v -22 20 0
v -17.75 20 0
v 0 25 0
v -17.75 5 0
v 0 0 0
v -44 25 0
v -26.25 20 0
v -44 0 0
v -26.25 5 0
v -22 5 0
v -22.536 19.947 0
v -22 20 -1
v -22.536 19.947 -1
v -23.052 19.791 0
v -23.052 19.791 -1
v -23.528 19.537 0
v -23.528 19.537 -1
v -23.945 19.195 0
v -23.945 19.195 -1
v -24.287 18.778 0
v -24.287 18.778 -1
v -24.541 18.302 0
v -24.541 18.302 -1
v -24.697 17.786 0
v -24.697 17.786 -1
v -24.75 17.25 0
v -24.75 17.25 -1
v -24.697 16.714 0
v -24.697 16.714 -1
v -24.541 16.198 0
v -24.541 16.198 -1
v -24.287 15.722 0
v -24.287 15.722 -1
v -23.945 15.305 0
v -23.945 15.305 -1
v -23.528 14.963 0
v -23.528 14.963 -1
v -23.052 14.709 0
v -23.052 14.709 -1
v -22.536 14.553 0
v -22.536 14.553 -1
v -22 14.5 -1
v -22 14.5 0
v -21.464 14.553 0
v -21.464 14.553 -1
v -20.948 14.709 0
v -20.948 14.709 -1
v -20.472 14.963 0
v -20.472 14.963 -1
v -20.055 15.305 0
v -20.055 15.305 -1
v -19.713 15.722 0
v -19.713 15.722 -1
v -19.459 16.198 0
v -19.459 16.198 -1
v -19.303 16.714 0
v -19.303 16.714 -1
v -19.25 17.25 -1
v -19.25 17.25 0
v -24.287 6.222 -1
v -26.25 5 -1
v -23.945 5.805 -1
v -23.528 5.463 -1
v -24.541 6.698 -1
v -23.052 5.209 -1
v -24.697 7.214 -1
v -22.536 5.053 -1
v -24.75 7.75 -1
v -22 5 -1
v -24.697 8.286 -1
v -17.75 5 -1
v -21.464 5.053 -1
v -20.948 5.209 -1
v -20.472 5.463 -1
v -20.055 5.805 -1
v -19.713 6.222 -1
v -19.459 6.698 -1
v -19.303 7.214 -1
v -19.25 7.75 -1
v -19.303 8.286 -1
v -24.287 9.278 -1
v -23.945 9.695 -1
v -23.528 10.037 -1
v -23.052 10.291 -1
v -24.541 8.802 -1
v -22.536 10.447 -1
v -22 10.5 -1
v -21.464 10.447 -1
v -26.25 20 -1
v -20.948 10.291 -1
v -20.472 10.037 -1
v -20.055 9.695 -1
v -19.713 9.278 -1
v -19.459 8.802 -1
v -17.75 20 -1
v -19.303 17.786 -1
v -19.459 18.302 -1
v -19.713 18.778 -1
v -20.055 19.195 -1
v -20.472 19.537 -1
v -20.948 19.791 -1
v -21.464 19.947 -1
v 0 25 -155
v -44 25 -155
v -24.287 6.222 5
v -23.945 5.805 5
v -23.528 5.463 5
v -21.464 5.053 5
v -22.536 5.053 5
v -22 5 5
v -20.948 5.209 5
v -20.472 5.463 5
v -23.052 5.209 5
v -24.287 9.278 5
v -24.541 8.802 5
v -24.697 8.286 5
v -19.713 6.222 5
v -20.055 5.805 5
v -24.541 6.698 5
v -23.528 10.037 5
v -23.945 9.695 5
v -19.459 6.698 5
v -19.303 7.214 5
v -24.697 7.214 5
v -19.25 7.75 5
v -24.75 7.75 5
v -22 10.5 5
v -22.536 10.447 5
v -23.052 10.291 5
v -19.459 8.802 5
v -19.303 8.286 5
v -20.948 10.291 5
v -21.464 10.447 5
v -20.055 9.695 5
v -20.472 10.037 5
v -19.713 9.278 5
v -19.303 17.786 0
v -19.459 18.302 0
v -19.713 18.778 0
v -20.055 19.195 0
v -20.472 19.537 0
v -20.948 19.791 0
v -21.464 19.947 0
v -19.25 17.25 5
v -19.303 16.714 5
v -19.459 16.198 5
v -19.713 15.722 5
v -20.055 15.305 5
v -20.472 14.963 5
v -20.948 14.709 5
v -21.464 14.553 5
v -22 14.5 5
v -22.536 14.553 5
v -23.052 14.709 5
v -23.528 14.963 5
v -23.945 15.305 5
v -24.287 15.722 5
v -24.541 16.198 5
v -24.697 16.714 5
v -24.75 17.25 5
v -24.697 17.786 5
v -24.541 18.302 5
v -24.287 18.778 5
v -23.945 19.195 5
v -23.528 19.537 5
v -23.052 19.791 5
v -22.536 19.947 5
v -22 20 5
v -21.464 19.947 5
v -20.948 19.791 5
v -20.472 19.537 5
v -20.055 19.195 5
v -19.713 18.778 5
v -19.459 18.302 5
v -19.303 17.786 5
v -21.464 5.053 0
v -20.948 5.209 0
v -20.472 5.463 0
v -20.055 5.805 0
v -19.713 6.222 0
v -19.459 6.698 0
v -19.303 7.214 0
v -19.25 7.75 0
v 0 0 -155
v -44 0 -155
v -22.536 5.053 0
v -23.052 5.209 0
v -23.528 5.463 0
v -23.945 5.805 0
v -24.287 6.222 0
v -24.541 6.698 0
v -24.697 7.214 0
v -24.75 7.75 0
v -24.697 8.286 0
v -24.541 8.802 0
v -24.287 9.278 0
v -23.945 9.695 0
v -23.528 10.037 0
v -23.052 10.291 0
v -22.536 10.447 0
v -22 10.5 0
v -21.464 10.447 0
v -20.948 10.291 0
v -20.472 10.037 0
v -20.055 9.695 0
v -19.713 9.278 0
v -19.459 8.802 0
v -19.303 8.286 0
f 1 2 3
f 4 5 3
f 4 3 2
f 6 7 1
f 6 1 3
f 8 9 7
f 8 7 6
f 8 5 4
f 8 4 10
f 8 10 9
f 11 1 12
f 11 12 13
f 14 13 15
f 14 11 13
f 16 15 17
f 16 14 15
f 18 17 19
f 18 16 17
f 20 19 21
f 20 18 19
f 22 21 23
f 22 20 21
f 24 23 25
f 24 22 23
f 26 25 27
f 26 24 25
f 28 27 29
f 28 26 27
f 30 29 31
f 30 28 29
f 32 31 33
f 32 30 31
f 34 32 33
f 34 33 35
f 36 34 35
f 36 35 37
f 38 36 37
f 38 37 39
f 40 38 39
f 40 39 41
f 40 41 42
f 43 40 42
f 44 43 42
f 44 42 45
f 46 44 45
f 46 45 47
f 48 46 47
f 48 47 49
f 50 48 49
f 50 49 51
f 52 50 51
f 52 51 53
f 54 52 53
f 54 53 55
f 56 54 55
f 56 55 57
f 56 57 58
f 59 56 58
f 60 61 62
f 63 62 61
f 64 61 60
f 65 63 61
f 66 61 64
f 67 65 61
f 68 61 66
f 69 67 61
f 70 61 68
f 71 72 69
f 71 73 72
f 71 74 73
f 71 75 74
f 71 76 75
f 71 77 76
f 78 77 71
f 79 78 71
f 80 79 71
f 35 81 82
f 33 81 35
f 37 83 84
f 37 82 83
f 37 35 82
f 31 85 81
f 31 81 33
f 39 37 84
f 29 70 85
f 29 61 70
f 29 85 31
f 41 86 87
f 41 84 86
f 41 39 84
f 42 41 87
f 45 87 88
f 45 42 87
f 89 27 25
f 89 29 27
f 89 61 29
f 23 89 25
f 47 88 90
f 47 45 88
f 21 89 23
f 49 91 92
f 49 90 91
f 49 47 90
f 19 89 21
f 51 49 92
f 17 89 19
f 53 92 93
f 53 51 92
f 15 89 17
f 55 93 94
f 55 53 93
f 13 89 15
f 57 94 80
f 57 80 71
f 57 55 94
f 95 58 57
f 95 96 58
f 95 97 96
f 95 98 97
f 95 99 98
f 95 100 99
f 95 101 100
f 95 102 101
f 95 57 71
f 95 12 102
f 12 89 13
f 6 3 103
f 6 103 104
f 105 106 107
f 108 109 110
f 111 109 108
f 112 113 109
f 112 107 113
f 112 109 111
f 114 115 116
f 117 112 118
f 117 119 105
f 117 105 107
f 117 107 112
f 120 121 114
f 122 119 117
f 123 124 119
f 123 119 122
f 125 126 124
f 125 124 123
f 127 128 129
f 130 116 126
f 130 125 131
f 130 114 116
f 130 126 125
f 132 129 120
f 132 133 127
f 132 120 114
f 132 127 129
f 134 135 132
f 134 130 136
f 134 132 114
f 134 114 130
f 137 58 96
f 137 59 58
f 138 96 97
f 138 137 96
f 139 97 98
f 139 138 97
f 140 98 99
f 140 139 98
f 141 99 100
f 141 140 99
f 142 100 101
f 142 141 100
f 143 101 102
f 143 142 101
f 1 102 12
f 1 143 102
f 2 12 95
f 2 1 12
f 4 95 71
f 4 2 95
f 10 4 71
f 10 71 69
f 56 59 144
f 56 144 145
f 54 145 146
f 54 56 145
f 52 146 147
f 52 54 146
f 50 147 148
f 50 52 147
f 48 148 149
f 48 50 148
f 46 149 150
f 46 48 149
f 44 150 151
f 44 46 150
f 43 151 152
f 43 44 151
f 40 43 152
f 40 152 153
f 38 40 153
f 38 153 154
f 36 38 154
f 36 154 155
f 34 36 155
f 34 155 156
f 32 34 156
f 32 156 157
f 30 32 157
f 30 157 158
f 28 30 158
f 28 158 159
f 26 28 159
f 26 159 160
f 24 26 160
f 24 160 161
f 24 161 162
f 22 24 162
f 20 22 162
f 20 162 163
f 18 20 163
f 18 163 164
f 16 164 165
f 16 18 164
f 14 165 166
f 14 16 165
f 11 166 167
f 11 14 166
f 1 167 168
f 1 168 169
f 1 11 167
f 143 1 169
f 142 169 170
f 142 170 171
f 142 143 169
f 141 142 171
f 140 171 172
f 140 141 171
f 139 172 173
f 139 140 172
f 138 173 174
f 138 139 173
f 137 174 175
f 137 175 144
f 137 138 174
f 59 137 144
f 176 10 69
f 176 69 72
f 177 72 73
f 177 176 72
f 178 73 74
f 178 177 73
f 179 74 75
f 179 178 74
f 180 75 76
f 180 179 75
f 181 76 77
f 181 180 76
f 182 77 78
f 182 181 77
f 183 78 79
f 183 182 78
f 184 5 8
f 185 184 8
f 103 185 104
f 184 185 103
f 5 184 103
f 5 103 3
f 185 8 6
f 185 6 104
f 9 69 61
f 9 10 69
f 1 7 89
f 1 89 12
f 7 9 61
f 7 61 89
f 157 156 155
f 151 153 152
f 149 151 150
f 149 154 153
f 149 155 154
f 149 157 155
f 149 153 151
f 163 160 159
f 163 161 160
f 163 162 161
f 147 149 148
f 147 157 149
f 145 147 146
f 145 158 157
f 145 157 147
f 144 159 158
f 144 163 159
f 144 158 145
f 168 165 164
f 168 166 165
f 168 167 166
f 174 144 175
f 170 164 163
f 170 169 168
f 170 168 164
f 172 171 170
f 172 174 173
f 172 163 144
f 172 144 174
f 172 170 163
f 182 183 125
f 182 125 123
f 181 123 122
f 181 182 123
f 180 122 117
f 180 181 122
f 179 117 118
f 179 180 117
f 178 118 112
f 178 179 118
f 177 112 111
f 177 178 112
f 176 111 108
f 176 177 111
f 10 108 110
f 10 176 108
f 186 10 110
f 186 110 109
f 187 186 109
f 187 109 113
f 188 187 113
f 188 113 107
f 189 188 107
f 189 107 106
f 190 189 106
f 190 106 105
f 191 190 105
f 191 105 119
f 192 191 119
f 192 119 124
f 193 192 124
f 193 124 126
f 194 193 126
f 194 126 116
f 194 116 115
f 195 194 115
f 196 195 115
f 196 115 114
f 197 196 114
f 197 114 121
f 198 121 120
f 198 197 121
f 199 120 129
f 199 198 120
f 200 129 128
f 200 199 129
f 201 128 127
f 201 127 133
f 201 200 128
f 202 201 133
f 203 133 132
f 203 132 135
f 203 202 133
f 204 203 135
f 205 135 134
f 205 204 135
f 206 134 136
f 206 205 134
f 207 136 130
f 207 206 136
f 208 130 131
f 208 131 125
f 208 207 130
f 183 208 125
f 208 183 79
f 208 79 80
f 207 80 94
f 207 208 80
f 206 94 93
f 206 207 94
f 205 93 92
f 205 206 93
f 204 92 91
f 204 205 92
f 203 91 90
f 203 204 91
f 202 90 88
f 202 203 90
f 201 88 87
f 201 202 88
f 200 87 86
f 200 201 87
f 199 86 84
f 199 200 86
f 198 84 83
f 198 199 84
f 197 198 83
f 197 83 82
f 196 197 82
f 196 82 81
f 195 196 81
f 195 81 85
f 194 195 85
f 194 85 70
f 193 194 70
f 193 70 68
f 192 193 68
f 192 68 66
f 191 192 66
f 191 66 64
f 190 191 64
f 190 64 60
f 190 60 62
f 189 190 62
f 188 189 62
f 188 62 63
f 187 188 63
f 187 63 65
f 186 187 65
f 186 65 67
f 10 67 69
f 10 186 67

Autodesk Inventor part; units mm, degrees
ref_plane "YZ Plane" through (0, 0, 0) normal (1, 0, 0) x (0, 1, 0)
ref_plane "XZ Plane" through (0, 0, 0) normal (0, 1, 0) x (-1, 0, 0)
ref_plane "XY Plane" through (0, 0, 0) normal (0, 0, 1) x (1, 0, 0)
sketch "Szkic1" plane through (0, 0, 0) normal (0, 1, 0) x (-1, 0, 0)
  line L0 (0, 0) -> (44, 0)
  line L1 (44, 0) -> (44, -155)
  line L2 (44, -155) -> (0, -155)
  line L3 (0, -155) -> (0, 0)
  dimension "d0" = 44
  dimension "d1" = 155
extrude "Wyciągnięcie proste1" add sketch "Szkic1" along normal blind 25
sketch "Szkic2" plane through (-44, 0, 0) normal (0, 0, 1) x (1, 0, 0)
  line L0 (0, 0) -> (44, 0) projected
  line L1 (44, 0) -> (44, 25) projected
  line L2 (0, 25) -> (44, 25) projected
  line L3 (0, 0) -> (0, 25) projected
  line L4 (17.75, 20) -> (26.25, 20)
  line L5 (26.25, 20) -> (26.25, 5)
  line L6 (26.25, 5) -> (17.75, 5)
  line L7 (17.75, 5) -> (17.75, 20)
  circle A0 centre (22, 17.25) radius 2.75
  circle A1 centre (22, 7.75) radius 2.75
  point P0 (26.25, 12.5)
  point P1 (44, 12.5)
  point P2 (22, 20)
  point P3 (22, 25)
  point P4 (22, 5)
  point P5 (22, 20)
  point P6 (22, 5)
  dimension "d4" = 8.5
  dimension "d5" = 15
  dimension "d6" = 5.5
  dimension "d7" = 5.5
extrude "Wyciągnięcie proste2" cut sketch "Szkic2" against normal blind 1 contours L4 L5 L6 L7
extrude "Wyciągnięcie proste3" add sketch "Szkic2" along normal blind 5 contours A1 | A0
properties part number "li_pol_3S_5000mAh"
